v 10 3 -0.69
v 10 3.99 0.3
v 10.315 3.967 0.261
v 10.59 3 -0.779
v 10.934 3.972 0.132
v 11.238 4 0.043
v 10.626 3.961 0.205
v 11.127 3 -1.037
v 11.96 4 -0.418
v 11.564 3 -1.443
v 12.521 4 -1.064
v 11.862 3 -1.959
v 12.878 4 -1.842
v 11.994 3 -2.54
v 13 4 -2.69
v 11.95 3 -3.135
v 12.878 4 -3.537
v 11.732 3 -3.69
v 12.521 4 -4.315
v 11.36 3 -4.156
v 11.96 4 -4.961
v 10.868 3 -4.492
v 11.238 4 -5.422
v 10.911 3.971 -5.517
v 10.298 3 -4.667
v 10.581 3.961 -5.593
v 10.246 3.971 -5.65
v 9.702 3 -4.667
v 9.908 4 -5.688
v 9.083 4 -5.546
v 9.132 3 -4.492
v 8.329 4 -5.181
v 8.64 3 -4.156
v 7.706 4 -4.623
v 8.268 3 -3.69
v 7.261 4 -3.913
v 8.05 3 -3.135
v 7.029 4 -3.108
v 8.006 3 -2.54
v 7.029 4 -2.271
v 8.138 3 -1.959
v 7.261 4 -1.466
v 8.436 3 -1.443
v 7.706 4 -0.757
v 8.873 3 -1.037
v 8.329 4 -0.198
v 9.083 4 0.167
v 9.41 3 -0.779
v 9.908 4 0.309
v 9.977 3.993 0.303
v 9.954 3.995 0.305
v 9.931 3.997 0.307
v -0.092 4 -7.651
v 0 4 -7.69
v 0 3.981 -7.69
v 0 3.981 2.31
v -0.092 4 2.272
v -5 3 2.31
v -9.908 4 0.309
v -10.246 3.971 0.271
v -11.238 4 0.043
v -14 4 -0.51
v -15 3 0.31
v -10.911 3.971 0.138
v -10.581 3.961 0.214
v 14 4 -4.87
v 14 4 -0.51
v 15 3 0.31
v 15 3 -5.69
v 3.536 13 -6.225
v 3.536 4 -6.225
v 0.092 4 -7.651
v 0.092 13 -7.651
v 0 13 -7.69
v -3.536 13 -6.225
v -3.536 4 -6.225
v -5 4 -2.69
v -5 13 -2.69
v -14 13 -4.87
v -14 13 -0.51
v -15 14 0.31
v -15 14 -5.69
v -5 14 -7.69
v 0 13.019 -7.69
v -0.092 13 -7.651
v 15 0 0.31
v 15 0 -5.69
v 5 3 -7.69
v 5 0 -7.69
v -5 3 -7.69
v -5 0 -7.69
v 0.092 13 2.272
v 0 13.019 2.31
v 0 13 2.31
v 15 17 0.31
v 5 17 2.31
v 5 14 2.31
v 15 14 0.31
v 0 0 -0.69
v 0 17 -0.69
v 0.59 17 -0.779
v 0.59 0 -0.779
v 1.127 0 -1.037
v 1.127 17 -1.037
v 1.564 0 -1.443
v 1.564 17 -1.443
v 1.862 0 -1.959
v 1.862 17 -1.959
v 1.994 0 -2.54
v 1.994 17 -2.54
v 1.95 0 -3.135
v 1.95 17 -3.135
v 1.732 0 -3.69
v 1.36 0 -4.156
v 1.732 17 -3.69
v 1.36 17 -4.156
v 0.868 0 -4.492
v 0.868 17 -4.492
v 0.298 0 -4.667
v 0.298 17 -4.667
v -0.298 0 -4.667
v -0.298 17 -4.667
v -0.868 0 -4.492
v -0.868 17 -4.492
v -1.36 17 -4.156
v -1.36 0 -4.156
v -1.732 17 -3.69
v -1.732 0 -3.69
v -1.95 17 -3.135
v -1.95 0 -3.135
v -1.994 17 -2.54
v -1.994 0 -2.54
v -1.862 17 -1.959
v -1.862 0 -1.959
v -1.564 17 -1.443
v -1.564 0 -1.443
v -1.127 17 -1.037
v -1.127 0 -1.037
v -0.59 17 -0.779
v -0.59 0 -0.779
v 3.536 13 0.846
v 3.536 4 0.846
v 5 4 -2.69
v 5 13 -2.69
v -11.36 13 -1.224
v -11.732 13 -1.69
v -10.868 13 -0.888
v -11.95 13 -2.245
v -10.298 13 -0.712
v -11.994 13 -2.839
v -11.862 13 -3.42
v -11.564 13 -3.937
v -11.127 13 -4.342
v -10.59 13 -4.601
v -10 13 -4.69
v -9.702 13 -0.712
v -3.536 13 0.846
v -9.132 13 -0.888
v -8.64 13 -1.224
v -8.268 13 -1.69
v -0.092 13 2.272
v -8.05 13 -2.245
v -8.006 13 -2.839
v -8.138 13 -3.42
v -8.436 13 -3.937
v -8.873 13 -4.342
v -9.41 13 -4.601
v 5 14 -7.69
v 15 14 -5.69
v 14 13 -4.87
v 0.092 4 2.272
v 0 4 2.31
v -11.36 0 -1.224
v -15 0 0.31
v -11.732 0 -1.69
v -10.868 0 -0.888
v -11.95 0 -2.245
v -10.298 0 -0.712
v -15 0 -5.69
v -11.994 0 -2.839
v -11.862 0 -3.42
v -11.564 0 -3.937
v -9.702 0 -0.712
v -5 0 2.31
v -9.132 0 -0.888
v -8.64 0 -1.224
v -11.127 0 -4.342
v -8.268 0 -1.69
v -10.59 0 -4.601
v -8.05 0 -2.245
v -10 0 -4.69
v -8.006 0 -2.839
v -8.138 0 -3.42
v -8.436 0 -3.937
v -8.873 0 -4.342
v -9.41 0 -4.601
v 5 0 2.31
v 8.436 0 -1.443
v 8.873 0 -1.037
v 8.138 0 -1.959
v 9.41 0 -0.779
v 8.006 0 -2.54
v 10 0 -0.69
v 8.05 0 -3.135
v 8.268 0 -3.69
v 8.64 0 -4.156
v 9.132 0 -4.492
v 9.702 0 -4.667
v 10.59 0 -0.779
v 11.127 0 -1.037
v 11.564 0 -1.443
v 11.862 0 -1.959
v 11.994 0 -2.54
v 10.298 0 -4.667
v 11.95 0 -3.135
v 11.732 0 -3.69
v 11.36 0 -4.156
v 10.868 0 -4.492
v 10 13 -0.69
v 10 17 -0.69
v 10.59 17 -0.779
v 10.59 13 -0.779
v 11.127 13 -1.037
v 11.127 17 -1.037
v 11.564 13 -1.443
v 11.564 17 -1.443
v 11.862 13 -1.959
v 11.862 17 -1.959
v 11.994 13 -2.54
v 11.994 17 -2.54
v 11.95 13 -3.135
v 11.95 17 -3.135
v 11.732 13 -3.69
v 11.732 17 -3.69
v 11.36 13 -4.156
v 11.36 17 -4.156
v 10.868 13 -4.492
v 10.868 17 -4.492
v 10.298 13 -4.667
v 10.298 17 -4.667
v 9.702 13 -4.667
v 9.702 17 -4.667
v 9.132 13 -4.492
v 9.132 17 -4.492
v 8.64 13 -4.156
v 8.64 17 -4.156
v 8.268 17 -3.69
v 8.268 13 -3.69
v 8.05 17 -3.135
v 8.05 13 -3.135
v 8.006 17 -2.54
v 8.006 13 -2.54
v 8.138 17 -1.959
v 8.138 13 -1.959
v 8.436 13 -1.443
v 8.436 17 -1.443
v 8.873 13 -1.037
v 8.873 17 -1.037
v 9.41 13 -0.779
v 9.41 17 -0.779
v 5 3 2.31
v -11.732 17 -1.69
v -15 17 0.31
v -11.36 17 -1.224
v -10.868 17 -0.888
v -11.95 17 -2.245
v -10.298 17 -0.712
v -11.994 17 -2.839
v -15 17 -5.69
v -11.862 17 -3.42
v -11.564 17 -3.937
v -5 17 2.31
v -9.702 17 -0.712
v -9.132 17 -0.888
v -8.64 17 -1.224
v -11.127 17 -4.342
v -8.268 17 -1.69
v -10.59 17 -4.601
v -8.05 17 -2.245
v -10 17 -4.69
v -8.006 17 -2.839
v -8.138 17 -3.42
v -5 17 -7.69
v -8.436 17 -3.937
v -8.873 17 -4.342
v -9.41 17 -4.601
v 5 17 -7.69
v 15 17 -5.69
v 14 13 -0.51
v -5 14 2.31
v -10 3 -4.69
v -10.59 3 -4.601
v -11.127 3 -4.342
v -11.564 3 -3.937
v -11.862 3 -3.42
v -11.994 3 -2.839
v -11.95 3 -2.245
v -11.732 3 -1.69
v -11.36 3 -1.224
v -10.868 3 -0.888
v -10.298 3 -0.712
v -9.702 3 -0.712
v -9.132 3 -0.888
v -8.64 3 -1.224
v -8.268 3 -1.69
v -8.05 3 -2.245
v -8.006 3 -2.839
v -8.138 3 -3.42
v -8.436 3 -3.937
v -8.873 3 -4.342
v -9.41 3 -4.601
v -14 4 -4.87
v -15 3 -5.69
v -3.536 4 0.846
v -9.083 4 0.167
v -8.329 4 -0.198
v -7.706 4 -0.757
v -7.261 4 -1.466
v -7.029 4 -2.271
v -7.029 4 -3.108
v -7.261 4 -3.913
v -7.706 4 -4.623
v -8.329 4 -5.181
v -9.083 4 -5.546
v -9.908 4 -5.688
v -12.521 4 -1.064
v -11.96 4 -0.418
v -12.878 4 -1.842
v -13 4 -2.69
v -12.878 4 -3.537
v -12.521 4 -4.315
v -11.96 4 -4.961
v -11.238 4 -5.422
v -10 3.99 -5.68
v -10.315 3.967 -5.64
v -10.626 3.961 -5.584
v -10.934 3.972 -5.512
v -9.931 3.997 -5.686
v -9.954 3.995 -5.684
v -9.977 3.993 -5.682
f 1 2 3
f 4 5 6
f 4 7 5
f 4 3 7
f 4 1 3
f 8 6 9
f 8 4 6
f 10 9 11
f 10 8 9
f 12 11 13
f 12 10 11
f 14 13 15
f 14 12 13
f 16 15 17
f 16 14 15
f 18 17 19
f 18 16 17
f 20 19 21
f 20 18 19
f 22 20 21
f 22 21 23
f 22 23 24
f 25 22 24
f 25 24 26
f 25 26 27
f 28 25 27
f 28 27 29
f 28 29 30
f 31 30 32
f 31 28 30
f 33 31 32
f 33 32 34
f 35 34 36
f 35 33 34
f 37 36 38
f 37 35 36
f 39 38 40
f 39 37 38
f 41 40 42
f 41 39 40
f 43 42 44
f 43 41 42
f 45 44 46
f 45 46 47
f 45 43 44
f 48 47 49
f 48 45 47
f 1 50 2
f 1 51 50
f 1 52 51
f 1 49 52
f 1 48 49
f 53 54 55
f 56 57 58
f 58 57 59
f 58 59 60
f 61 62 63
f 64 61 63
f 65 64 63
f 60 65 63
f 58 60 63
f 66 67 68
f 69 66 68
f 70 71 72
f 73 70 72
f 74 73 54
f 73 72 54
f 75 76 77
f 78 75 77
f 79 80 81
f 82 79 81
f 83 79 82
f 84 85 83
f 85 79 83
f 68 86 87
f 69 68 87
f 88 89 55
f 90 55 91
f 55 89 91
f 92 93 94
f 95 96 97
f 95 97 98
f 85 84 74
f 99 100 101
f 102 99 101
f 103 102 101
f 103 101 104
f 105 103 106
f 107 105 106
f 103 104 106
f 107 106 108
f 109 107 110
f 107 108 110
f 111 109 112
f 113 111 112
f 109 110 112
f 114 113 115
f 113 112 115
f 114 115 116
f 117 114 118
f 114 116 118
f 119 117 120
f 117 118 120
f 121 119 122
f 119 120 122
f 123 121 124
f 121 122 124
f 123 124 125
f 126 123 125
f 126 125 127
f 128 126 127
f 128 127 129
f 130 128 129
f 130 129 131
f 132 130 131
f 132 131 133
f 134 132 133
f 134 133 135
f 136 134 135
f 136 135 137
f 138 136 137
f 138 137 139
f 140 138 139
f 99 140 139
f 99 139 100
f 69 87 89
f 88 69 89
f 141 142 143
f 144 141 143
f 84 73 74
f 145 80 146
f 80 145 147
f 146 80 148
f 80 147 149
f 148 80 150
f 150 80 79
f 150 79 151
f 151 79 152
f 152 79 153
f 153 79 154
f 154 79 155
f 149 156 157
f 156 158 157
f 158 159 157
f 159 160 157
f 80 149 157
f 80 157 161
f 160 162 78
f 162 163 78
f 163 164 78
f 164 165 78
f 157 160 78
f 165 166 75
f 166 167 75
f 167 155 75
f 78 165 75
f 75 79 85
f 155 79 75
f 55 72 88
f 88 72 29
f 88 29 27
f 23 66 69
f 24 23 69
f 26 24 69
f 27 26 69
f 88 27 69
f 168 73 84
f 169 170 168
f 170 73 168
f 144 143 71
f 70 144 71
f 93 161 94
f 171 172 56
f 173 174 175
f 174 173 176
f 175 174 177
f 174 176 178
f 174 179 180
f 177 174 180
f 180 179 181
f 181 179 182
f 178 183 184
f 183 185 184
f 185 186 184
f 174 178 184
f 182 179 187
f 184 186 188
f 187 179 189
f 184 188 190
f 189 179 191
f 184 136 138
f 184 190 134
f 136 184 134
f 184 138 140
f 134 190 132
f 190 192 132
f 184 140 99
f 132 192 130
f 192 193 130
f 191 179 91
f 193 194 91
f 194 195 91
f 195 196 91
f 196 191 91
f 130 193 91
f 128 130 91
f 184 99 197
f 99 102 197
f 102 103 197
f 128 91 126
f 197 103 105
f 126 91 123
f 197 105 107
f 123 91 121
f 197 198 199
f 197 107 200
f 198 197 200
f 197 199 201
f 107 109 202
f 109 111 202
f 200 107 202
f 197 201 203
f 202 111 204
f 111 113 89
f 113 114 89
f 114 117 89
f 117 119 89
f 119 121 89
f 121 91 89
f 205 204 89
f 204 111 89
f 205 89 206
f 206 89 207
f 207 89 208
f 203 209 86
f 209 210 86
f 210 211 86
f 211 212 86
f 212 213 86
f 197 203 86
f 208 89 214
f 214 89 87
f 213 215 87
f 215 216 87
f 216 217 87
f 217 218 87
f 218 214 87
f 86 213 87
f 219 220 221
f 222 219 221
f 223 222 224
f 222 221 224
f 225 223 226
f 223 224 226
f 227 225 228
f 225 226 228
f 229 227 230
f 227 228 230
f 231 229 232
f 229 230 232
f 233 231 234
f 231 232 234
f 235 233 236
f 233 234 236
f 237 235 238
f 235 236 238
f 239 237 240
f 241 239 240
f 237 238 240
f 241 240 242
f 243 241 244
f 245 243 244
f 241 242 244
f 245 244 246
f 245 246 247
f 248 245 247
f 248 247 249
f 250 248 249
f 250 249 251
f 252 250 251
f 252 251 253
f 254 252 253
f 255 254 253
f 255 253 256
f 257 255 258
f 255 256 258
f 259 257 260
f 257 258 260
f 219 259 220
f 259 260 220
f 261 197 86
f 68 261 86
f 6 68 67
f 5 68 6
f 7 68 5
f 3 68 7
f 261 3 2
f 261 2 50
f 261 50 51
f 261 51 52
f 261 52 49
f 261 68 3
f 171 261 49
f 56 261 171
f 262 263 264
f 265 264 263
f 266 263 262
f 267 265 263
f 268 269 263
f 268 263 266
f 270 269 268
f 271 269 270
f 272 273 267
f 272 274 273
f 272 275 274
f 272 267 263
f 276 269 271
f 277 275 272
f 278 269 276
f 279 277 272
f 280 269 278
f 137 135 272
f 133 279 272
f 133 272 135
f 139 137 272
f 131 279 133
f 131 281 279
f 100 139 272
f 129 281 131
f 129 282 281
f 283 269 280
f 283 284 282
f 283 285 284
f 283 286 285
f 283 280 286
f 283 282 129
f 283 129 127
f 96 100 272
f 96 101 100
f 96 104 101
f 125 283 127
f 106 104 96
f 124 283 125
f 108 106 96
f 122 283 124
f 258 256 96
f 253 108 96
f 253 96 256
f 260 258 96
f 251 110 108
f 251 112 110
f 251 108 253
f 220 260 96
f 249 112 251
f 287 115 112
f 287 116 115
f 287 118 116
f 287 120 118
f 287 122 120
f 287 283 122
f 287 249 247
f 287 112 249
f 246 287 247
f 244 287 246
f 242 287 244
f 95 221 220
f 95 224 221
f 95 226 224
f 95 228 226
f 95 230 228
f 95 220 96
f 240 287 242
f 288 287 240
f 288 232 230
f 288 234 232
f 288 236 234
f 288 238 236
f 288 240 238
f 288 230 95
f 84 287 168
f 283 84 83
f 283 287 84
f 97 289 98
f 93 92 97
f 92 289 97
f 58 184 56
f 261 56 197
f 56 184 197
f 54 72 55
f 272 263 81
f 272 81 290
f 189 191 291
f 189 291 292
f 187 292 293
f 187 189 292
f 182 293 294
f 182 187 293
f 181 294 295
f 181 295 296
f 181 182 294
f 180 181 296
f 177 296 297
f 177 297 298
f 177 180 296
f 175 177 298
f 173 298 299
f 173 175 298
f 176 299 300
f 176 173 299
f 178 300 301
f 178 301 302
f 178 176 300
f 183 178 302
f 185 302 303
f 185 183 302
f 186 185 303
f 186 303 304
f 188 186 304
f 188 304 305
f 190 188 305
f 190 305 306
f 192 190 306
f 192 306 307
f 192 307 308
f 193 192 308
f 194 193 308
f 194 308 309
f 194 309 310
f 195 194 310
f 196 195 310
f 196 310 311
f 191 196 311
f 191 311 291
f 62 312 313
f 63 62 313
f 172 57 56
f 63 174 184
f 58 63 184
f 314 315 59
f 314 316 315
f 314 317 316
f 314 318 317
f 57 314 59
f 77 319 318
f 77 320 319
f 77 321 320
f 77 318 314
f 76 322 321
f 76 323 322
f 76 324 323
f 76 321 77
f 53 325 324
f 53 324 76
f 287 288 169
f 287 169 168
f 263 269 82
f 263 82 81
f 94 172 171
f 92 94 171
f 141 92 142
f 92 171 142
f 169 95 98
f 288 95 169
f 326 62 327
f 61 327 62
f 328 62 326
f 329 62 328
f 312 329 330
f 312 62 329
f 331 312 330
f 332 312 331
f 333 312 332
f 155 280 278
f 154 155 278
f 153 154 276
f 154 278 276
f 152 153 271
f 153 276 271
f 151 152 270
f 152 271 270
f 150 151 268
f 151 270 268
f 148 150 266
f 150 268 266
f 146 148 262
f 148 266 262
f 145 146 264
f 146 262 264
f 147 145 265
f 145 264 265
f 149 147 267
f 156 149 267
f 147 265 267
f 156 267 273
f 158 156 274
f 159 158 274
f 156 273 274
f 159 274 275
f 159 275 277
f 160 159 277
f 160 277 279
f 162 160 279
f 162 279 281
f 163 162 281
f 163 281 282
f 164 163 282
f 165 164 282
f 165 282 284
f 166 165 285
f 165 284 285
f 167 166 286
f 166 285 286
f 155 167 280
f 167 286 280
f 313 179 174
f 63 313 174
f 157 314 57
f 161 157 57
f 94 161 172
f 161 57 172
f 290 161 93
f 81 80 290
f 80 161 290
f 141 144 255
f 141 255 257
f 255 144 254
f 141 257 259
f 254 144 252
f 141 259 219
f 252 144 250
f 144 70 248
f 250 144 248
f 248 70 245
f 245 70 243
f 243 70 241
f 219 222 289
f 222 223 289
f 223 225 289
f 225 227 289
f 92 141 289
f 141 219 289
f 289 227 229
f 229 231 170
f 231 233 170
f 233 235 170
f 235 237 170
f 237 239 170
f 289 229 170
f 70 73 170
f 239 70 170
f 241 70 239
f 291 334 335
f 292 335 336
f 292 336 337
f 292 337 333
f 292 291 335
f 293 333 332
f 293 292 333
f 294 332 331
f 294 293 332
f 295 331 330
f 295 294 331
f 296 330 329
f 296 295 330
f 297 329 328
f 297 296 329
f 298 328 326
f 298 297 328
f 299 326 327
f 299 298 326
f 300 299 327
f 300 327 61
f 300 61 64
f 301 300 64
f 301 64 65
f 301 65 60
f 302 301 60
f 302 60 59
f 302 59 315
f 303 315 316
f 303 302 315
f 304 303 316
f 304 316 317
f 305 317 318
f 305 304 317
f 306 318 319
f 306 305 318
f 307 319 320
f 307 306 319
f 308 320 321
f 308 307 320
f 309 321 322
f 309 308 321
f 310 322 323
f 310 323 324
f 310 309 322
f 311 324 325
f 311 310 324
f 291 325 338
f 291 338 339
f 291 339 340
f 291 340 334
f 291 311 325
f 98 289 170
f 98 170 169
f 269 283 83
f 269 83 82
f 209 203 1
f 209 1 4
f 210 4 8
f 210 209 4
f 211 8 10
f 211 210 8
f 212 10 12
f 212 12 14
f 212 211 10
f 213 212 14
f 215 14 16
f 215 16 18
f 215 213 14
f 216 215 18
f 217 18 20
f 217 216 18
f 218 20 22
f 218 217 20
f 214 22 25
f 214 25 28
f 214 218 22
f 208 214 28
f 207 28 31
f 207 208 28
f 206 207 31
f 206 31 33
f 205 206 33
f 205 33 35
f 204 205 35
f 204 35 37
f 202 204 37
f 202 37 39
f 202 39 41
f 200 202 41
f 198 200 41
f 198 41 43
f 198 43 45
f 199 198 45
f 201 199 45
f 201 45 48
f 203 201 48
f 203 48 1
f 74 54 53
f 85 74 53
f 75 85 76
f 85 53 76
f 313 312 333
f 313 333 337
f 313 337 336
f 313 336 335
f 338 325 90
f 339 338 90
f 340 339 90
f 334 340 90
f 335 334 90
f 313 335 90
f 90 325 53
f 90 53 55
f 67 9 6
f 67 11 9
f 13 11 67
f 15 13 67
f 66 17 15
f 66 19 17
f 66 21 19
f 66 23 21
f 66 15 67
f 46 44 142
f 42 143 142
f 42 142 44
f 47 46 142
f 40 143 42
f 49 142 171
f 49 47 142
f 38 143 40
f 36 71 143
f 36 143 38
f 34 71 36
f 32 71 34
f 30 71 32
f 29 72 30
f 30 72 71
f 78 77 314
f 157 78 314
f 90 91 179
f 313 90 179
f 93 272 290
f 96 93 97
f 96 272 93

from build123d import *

# Parameters (mm, degrees)
SKETCH1_R               = 2
BOSS_EXTRUDE1_DEPTH     = 4
BOSS_EXTRUDE2_START     = 4
BOSS_EXTRUDE2_DEPTH     = 9
CHAMFER2_SIZE           = 1
CHAMFER3_SIZE           = 1
CUT_EXTRUDE2_DEPTH      = 10
CUT_EXTRUDE2_DEPTH_BACK = 9
SKETCH1_2_R             = 2
SKETCH6_R               = 2
CUT_EXTRUDE3_DEPTH      = 17


with BuildPart() as part:
    # Sketch1 → Boss-Extrude1 (new body)
    with BuildSketch(Plane(origin=(0, 0, 0), x_dir=(1, 0, 0), z_dir=(0, 1, 0))):
        Polygon((-5, -2.310289343), (5, -2.310289343), (15, -0.310289343), (15, 5.689710657), (5, 7.689710657), (-5, 7.689710657), (-15, 5.689710657), (-15, -0.310289343), align=None)
        with Locations(Location((10, 2.689710657, 0), (0, 0, 270))):
            Circle(SKETCH1_R, mode=Mode.SUBTRACT)
        with Locations(Location((0, 2.689710657, 0), (0, 0, 270))):
            Circle(SKETCH1_R, mode=Mode.SUBTRACT)
        with Locations(Location((-10, 2.689710657, 0), (0, 0, 90))):
            Circle(SKETCH1_R, mode=Mode.SUBTRACT)
    boss_extrude1 = extrude(amount=BOSS_EXTRUDE1_DEPTH)

    # Sketch2 → Boss-Extrude2 (add)
    with BuildSketch(Plane(origin=(0, 0, 0), x_dir=(1, 0, 0), z_dir=(0, 1, 0)).offset(BOSS_EXTRUDE2_START)):
        Polygon((0, -2.310289343), (3.535533906, -0.845823249), (5, 2.689710657), (3.535533906, 6.225244563), (0, 7.689710657), (-3.535533906, 6.225244563), (-5, 2.689710657), (-3.535533906, -0.845823249), align=None)
    extrude(amount=BOSS_EXTRUDE2_DEPTH)

    # Mirror1: Boss-Extrude1 across plane
    add(boss_extrude1.mirror(Plane.ZX.offset(8.5)))

    # Chamfer2
    # the kernel refuses this chamfer: 1 mm, written as the material it takes off along each edge
    with BuildSketch(Plane(origin=(17.521742642, 4, -5.185362128), x_dir=(-0.19611613513818452, 0, 0.9805806756909201), z_dir=(-0.9805806756909201, 0, -0.19611613513818454))) as chamfer2_piece_1_section:
        Polygon((CHAMFER2_SIZE, 0), (0, -CHAMFER2_SIZE), (0, 0), align=None)
    chamfer2_piece_1 = extrude(amount=20.484770979, mode=Mode.PRIVATE)
    chamfer2_piece_1 = split(chamfer2_piece_1, bisect_by=Plane(origin=(15.841163755, 4, -1.128085786), z_dir=(0.38268343236508956, 0, -0.9238795325112868)), keep=Keep.TOP, mode=Mode.PRIVATE)
    add(chamfer2_piece_1, mode=Mode.SUBTRACT)
    with BuildSketch(Plane(origin=(15, 4, 2.881972331), x_dir=(-1, 0, 0), z_dir=(0, 0, -1))) as chamfer2_piece_2:
        Polygon((CHAMFER2_SIZE, 0), (0, -CHAMFER2_SIZE), (0, 0), align=None)
    extrude(amount=11.143365976, mode=Mode.SUBTRACT)
    with BuildSketch(Plane(origin=(-2.565227926, 4, 3.823334929), x_dir=(0, -1, 0), z_dir=(0.9805806756909202, 0, -0.19611613513818407))) as chamfer2_piece_3_section:
        Polygon((CHAMFER2_SIZE, 0), (0, CHAMFER2_SIZE), (0, 0), align=None)
    chamfer2_piece_3 = extrude(amount=20.484770979, mode=Mode.PRIVATE)
    chamfer2_piece_3 = split(chamfer2_piece_3, bisect_by=Plane(origin=(-2.724501391, 4, 3.43881477), z_dir=(0.38268343236508995, 0, 0.9238795325112867)), keep=Keep.TOP, mode=Mode.PRIVATE)
    add(chamfer2_piece_3, mode=Mode.SUBTRACT)
    with BuildSketch(Plane(origin=(10, 4, -2.689710657), x_dir=(0, 0, 1), z_dir=(-1, 0, 0))) as chamfer2_piece_4:
        Polygon((2 + CHAMFER2_SIZE, 0), (2, -CHAMFER2_SIZE), (2, 0), align=None)
    revolve(axis=Axis((10, 4, -2.689710657), (0, 1, 0)), mode=Mode.SUBTRACT)
    with BuildSketch(Plane(origin=(-2.565227926, 13, 3.823334929), x_dir=(-0.19611613513818407, 0, -0.9805806756909202), z_dir=(0.9805806756909202, 0, -0.19611613513818407))) as chamfer2_piece_5_section:
        Polygon((CHAMFER2_SIZE, 0), (0, CHAMFER2_SIZE), (0, 0), align=None)
    chamfer2_piece_5 = extrude(amount=20.484770979, mode=Mode.PRIVATE)
    chamfer2_piece_5 = split(chamfer2_piece_5, bisect_by=Plane(origin=(-2.724501391, 13, 3.43881477), z_dir=(0.38268343236508995, 0, 0.9238795325112867)), keep=Keep.TOP, mode=Mode.PRIVATE)
    add(chamfer2_piece_5, mode=Mode.SUBTRACT)
    with BuildSketch(Plane(origin=(17.521742642, 13, -5.185362128), x_dir=(-0.19611613513818452, 0, 0.9805806756909201), z_dir=(-0.9805806756909201, 0, -0.19611613513818454))) as chamfer2_piece_6_section:
        Polygon((CHAMFER2_SIZE, 0), (0, CHAMFER2_SIZE), (0, 0), align=None)
    chamfer2_piece_6 = extrude(amount=20.484770979, mode=Mode.PRIVATE)
    chamfer2_piece_6 = split(chamfer2_piece_6, bisect_by=Plane(origin=(15.841163755, 13, -1.128085786), z_dir=(0.38268343236508956, 0, -0.9238795325112868)), keep=Keep.TOP, mode=Mode.PRIVATE)
    add(chamfer2_piece_6, mode=Mode.SUBTRACT)
    with BuildSketch(Plane(origin=(15, 13, 2.881972331), x_dir=(-1, 0, 0), z_dir=(0, 0, -1))) as chamfer2_piece_7:
        Polygon((CHAMFER2_SIZE, 0), (0, CHAMFER2_SIZE), (0, 0), align=None)
    extrude(amount=11.143365976, mode=Mode.SUBTRACT)

    # Chamfer3
    # the kernel refuses this chamfer: 1 mm, written as the material it takes off along each edge
    with BuildSketch(Plane(origin=(-10, 4, -2.689710657), x_dir=(0, 0, -1), z_dir=(1, 0, 0))) as chamfer3_piece_1:
        Polygon((2 + CHAMFER3_SIZE, 0), (2, -CHAMFER3_SIZE), (2, 0), align=None)
    revolve(axis=Axis((-10, 4, -2.689710657), (0, 1, 0)), mode=Mode.SUBTRACT)
    with BuildSketch(Plane(origin=(2.565227926, 13, -9.202756242), x_dir=(0.19611613513818496, 0, 0.98058067569092), z_dir=(-0.98058067569092, 0, 0.19611613513818493))) as chamfer3_piece_2_section:
        Polygon((CHAMFER3_SIZE, 0), (0, CHAMFER3_SIZE), (0, 0), align=None)
    chamfer3_piece_2 = extrude(amount=20.484770979, mode=Mode.PRIVATE)
    chamfer3_piece_2 = split(chamfer3_piece_2, bisect_by=Plane(origin=(2.724501391, 13, -8.818236083), z_dir=(-0.38268343236509006, 0, -0.9238795325112867)), keep=Keep.TOP, mode=Mode.PRIVATE)
    add(chamfer3_piece_2, mode=Mode.SUBTRACT)
    with BuildSketch(Plane(origin=(-15, 13, -8.261393645), x_dir=(1, 0, 0), z_dir=(0, 0, 1))) as chamfer3_piece_3:
        Polygon((CHAMFER3_SIZE, 0), (0, CHAMFER3_SIZE), (0, 0), align=None)
    extrude(amount=11.143365976, mode=Mode.SUBTRACT)
    with BuildSketch(Plane(origin=(-17.521742642, 13, -0.194059185), x_dir=(0.19611613513818402, 0, -0.9805806756909202), z_dir=(0.9805806756909202, 0, 0.19611613513818402))) as chamfer3_piece_4_section:
        Polygon((CHAMFER3_SIZE, 0), (0, CHAMFER3_SIZE), (0, 0), align=None)
    chamfer3_piece_4 = extrude(amount=20.484770979, mode=Mode.PRIVATE)
    chamfer3_piece_4 = split(chamfer3_piece_4, bisect_by=Plane(origin=(-15.841163755, 13, -4.251335528), z_dir=(-0.3826834323650897, 0, 0.9238795325112868)), keep=Keep.TOP, mode=Mode.PRIVATE)
    add(chamfer3_piece_4, mode=Mode.SUBTRACT)
    with BuildSketch(Plane(origin=(2.565227926, 4, -9.202756242), x_dir=(0.19611613513818496, 0, 0.98058067569092), z_dir=(-0.98058067569092, 0, 0.19611613513818493))) as chamfer3_piece_5_section:
        Polygon((CHAMFER3_SIZE, 0), (0, -CHAMFER3_SIZE), (0, 0), align=None)
    chamfer3_piece_5 = extrude(amount=20.484770979, mode=Mode.PRIVATE)
    chamfer3_piece_5 = split(chamfer3_piece_5, bisect_by=Plane(origin=(2.724501391, 4, -8.818236083), z_dir=(-0.38268343236509006, 0, -0.9238795325112867)), keep=Keep.TOP, mode=Mode.PRIVATE)
    add(chamfer3_piece_5, mode=Mode.SUBTRACT)
    with BuildSketch(Plane(origin=(-15, 4, -8.261393645), x_dir=(1, 0, 0), z_dir=(0, 0, 1))) as chamfer3_piece_6:
        Polygon((CHAMFER3_SIZE, 0), (0, -CHAMFER3_SIZE), (0, 0), align=None)
    extrude(amount=11.143365976, mode=Mode.SUBTRACT)
    with BuildSketch(Plane(origin=(-17.521742642, 4, -0.194059185), x_dir=(0.19611613513818402, 0, -0.9805806756909202), z_dir=(0.9805806756909202, 0, 0.19611613513818402))) as chamfer3_piece_7_section:
        Polygon((CHAMFER3_SIZE, 0), (0, -CHAMFER3_SIZE), (0, 0), align=None)
    chamfer3_piece_7 = extrude(amount=20.484770979, mode=Mode.PRIVATE)
    chamfer3_piece_7 = split(chamfer3_piece_7, bisect_by=Plane(origin=(-15.841163755, 4, -4.251335528), z_dir=(-0.3826834323650897, 0, 0.9238795325112868)), keep=Keep.TOP, mode=Mode.PRIVATE)
    add(chamfer3_piece_7, mode=Mode.SUBTRACT)

    # Sketch1<2> → Cut-Extrude2 (cut, two sides: drawn at the far end of the back side and taken through both)
    with BuildSketch(Plane(origin=(0, 0, 0), x_dir=(1, 0, 0), z_dir=(0, 1, 0)).offset(-CUT_EXTRUDE2_DEPTH_BACK)):
        with Locations(Location((0, 2.689710657, 0), (0, 0, 270))):
            Circle(SKETCH1_2_R)
    extrude(amount=CUT_EXTRUDE2_DEPTH + CUT_EXTRUDE2_DEPTH_BACK, mode=Mode.SUBTRACT)

    # Sketch6 → Cut-Extrude3 (cut)
    with BuildSketch(Plane(origin=(0, 13, 0), x_dir=(1, 0, 0), z_dir=(0, 1, 0))):
        with Locations(Location((0, 2.689710657, 0), (0, 0, 270))):
            Circle(SKETCH6_R)
    extrude(amount=-CUT_EXTRUDE3_DEPTH, mode=Mode.SUBTRACT)


solid = part.part
